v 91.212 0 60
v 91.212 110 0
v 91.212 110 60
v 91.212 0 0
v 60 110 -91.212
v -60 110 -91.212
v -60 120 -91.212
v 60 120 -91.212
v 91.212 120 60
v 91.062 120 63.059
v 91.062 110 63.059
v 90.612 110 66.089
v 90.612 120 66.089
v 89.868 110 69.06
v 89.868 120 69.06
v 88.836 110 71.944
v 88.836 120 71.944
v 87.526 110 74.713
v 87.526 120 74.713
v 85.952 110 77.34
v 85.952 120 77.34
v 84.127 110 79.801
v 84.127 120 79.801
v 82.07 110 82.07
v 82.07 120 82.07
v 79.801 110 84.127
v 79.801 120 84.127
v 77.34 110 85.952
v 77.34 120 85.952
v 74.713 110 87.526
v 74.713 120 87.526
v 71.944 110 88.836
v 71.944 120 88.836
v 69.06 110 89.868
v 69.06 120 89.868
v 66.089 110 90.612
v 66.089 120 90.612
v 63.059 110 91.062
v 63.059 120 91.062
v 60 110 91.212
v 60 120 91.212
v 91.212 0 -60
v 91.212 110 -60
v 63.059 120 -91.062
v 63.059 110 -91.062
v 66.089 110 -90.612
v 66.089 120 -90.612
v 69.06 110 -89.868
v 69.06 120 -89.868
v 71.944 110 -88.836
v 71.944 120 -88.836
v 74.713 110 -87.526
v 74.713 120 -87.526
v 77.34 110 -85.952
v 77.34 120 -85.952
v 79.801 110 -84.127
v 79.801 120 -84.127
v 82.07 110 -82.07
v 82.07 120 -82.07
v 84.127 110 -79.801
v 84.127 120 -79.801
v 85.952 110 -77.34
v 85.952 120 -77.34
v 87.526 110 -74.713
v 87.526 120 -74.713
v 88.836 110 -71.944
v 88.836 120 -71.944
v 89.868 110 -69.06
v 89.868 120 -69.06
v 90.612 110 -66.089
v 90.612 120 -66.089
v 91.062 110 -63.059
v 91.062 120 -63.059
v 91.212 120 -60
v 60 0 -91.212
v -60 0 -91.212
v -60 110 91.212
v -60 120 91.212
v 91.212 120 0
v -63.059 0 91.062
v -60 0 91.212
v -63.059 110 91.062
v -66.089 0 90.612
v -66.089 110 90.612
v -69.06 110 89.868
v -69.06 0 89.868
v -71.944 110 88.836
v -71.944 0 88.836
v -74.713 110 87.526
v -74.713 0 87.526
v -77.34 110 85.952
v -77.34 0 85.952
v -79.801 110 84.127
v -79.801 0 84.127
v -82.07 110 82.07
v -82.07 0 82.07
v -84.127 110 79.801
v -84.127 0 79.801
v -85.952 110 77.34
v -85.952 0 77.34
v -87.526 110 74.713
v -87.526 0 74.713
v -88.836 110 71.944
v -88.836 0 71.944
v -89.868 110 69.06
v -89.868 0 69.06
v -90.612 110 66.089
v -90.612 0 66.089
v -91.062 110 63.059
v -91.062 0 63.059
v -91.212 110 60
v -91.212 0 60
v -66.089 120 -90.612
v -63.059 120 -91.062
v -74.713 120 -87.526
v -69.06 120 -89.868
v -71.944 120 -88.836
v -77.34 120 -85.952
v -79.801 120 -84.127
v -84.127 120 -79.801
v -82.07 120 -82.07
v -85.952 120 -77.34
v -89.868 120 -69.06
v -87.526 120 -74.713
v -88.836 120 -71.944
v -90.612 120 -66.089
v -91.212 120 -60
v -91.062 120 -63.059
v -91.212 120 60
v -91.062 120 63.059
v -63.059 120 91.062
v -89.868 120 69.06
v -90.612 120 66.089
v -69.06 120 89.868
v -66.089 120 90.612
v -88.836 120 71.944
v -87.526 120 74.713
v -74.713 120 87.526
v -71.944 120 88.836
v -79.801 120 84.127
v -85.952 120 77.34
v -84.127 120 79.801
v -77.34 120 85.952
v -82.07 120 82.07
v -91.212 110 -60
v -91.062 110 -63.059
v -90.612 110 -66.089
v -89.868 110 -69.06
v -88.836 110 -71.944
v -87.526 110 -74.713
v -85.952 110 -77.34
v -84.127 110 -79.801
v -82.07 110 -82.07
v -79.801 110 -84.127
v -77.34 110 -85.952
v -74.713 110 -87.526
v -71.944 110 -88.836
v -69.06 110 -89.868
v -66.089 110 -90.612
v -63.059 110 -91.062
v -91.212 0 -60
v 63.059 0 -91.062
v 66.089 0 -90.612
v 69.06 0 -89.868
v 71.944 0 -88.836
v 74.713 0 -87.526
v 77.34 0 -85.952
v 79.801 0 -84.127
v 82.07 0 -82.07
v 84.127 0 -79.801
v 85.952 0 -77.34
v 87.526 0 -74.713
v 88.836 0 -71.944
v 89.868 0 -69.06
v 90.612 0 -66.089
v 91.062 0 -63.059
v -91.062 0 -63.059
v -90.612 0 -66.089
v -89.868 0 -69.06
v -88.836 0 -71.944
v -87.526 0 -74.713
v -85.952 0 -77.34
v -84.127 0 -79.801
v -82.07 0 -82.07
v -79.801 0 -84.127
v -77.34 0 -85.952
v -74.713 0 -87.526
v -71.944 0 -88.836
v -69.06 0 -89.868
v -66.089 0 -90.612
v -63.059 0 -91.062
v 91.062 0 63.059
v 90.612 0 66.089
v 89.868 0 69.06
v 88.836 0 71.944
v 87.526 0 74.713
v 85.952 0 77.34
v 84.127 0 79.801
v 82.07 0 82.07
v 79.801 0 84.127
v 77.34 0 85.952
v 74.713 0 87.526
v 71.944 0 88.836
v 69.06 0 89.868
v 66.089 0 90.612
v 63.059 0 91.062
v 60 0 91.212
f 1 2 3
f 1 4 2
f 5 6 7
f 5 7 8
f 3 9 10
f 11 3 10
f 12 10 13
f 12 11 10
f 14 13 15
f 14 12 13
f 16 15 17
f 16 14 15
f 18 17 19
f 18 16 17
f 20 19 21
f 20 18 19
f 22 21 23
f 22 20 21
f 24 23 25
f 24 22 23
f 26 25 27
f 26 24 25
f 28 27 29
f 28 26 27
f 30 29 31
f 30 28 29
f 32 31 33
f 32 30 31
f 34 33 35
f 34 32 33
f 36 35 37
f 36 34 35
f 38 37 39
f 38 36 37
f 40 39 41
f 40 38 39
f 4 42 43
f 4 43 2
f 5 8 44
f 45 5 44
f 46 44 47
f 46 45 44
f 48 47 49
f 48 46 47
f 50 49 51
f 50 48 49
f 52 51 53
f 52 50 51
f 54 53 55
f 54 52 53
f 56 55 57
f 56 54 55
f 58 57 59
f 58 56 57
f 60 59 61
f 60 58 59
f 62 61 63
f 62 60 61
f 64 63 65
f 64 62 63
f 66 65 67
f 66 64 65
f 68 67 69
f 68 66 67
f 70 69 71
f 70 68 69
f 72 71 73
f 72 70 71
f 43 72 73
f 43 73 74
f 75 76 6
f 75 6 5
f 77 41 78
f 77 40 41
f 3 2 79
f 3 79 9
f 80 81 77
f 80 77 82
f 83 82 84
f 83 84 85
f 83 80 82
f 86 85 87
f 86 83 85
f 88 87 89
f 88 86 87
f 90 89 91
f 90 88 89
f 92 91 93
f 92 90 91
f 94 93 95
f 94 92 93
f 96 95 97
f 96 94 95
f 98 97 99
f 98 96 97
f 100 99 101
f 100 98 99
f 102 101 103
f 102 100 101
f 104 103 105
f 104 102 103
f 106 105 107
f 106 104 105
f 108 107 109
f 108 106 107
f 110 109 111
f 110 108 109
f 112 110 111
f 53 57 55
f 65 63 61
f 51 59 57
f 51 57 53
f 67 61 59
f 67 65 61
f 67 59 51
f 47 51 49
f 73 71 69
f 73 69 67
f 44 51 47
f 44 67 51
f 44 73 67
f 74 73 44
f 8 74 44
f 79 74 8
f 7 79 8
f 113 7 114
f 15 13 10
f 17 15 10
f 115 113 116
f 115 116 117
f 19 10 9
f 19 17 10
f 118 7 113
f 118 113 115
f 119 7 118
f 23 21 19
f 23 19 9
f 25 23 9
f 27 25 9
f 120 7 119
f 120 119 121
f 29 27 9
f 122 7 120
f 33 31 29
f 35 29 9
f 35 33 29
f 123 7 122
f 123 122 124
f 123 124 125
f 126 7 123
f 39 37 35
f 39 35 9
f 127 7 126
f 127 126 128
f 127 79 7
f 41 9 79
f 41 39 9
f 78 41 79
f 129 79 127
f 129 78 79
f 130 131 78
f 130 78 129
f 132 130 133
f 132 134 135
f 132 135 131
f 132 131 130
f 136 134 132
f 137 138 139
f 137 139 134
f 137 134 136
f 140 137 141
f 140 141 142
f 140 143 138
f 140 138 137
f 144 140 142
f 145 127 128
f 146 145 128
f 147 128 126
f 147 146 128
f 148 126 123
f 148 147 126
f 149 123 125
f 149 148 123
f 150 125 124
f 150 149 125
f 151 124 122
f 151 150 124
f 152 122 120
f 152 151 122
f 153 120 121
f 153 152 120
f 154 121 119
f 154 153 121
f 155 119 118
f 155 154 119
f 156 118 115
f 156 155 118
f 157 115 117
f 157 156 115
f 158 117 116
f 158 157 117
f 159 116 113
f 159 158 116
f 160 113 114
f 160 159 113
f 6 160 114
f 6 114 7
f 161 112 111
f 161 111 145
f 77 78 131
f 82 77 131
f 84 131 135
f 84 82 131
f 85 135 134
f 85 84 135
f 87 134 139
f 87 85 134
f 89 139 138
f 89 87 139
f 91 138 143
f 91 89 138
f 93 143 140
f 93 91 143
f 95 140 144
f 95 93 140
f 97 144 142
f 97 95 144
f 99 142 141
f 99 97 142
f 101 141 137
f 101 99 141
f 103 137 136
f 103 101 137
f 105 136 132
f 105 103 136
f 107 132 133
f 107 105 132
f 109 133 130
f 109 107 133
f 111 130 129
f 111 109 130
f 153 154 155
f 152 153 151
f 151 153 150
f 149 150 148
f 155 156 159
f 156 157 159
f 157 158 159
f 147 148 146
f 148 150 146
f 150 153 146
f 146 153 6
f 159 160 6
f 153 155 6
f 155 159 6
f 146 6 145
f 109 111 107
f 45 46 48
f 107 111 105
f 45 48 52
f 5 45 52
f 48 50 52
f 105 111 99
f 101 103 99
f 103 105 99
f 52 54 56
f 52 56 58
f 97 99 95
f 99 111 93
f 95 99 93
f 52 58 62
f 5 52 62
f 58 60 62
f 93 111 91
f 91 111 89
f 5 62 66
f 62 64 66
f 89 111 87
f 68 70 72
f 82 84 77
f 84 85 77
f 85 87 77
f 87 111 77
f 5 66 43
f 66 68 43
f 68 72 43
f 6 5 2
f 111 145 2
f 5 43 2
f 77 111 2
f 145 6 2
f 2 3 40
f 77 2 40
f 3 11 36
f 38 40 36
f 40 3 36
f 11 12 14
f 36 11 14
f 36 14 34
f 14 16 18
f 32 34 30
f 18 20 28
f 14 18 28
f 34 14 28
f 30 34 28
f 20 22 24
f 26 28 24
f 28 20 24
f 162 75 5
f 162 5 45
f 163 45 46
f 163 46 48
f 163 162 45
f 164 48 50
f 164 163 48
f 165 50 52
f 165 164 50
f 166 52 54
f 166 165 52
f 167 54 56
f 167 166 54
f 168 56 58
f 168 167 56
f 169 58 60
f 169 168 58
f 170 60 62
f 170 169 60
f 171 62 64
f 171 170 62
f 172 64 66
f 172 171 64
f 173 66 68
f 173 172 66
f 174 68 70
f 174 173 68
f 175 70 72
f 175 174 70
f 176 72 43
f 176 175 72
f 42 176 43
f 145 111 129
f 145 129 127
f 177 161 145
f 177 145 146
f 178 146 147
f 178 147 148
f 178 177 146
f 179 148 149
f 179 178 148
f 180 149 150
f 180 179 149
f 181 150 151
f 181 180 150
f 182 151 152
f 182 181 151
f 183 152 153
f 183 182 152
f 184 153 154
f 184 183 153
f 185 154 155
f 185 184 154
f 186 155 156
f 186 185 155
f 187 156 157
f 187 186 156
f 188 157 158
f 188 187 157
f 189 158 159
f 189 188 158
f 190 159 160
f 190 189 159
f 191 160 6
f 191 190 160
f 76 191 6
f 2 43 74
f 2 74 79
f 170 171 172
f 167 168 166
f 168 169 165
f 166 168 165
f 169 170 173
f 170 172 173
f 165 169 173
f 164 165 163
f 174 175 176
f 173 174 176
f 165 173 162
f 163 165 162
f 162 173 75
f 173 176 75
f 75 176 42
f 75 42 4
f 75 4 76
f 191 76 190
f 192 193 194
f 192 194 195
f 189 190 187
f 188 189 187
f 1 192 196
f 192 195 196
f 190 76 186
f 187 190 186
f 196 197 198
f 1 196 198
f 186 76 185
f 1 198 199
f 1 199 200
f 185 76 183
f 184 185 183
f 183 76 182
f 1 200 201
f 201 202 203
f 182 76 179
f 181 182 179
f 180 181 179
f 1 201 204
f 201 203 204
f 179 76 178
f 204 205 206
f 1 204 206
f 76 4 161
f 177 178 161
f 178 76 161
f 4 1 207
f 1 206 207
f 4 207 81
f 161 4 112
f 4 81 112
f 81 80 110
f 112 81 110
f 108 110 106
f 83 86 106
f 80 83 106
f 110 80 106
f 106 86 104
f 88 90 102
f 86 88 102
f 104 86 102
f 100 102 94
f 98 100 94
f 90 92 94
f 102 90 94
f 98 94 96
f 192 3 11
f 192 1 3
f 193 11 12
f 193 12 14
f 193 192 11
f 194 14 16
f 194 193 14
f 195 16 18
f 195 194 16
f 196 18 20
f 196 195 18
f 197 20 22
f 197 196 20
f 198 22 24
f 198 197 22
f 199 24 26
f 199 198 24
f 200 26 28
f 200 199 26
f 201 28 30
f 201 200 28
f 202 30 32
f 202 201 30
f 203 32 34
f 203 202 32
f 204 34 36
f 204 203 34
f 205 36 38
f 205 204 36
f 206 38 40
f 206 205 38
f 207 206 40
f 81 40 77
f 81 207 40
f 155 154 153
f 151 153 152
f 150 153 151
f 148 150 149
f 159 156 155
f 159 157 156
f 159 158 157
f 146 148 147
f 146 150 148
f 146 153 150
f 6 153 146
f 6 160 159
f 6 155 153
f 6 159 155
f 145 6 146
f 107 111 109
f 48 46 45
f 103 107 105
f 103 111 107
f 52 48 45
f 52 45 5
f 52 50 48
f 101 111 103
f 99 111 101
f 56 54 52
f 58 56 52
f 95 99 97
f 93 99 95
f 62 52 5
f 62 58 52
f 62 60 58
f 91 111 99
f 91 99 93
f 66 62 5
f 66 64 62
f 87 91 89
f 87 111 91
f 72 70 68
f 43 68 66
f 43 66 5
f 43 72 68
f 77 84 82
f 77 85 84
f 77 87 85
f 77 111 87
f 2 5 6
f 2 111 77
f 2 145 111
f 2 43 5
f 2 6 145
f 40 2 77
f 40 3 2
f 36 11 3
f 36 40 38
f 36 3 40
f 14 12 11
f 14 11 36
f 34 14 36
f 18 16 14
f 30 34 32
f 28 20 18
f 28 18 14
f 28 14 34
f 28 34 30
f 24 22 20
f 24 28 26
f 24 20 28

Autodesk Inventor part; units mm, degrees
ref_plane "YZ Plane" through (0, 0, 0) normal (1, 0, 0) x (0, 1, 0)
ref_plane "XY Plane" through (0, 0, 0) normal (0, 0, 1) x (1, 0, 0)
sketch "Sketch1" plane through (0, 0, 0) normal (0, 1, 0) x (-1, 0, 0)
  line L0 (91.2118, 60) -> (91.2118, -60)
  arc A0 (60, -91.2118) -> (91.2118, -60) centre (60, -60) ccw
  arc A1 (-91.2118, -60) -> (-60, -91.2118) centre (-60, -60) ccw
  line L1 (-91.2118, -60) -> (-91.2118, 60)
  line L2 (-91.2118, 60) -> (-91.2118, 0)
  arc A2 (-60, 91.2118) -> (-91.2118, 60) centre (-60, 60) ccw
  line L3 (-60, 91.2118) -> (60, 91.2118)
  arc A3 (91.2118, 60) -> (60, 91.2118) centre (60, 60) ccw
  line L4 (60, -91.2118) -> (-60, -91.2118)
  line L5 (91.2118, 0) -> (-91.2118, 0) construction
  line L6 (0, -91.2118) -> (0, 91.2118) construction
  point P0 (0, 0)
  point P1 (0, 0)
  dimension "d15" = 120
  dimension "d17" = 120
  dimension "d18" = 120
  dimension "d19" = 120
  dimension "d20" = 31.2118
ref_plane "Work Plane1" through (0, 110, 0) normal (0, 1, 0) x (-1, 0, 0)
extrude "Extrusion2" add sketch "Sketch1" along normal blind 120
split body "Split1" result two bodies by plane through (0, 110, 0) normal (0, 1, 0) first body at (-30.4039, 110.5, 0)
equation "\"d18\" = d17"
equation "\"d19\" = d18"
properties part number "case" material "PET Plastic"
